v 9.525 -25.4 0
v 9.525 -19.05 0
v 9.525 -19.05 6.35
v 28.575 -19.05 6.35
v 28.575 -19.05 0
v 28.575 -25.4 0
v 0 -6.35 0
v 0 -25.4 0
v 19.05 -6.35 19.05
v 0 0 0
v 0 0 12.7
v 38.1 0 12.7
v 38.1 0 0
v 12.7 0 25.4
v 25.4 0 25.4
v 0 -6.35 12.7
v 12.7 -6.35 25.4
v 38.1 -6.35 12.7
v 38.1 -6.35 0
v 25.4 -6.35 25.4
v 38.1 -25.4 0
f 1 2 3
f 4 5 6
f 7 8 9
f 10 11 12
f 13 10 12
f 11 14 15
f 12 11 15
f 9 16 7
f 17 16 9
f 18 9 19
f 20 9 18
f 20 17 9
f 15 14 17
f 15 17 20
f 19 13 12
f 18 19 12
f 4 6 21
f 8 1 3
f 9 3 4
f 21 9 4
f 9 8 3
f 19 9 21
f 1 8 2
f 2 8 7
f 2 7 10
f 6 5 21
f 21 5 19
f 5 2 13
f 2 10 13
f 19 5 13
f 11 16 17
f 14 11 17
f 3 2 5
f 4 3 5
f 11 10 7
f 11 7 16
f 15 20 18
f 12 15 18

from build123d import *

# Parameters (mm, degrees)
F0_W     = 38.1
F0_H     = 25.4
F1_DEPTH = 25.4
F3_DEPTH = 25.4
F5_DEPTH = 19.05
F7_DEPTH = 558.8
F8_W     = 19.05
F8_H     = 6.35
F9_DEPTH = 25.4


with BuildPart() as f1:
    # F0 (on Front) → F1 (new body)
    with BuildSketch(Plane.XZ):
        with Locations((19.05, 12.7)):
            Rectangle(F0_W, F0_H)
    extrude(amount=F1_DEPTH)

    # F2 (on face) → F3 (cut)
    with BuildSketch(Plane.XZ.offset(25.4)):
        Polygon((12.7, 25.4), (0, 25.4), (0, 12.7), align=None)
        Polygon((38.1, 12.7), (38.1, 25.4), (25.4, 25.4), align=None)
    extrude(amount=-F3_DEPTH, mode=Mode.SUBTRACT)

    # F4 (on face) → F5 (cut)
    with BuildSketch(Plane.XZ.offset(25.4)):
        Polygon((0, 0), (19.05, 19.05), (38.1, 0), (38.1, 12.7), (25.4, 25.4), (12.7, 25.4), (0, 12.7), align=None)
    extrude(amount=-F5_DEPTH, mode=Mode.SUBTRACT)

    # F6 (on Right) → F7 (cut)
    with BuildSketch(Plane.YZ):
        Polygon((-25.4, 19.05), (-25.4, 0), (-6.35, 19.05), align=None)
    extrude(amount=F7_DEPTH, mode=Mode.SUBTRACT)

    # F8 (on face) → F9 (cut)
    with BuildSketch(Plane(origin=(0, 0, 0), x_dir=(1, 0, 0), z_dir=(0, 0, -1))):
        with Locations((19.05, 22.225)):
            Rectangle(F8_W, F8_H)
    extrude(amount=-F9_DEPTH, mode=Mode.SUBTRACT)


solid = f1.part
